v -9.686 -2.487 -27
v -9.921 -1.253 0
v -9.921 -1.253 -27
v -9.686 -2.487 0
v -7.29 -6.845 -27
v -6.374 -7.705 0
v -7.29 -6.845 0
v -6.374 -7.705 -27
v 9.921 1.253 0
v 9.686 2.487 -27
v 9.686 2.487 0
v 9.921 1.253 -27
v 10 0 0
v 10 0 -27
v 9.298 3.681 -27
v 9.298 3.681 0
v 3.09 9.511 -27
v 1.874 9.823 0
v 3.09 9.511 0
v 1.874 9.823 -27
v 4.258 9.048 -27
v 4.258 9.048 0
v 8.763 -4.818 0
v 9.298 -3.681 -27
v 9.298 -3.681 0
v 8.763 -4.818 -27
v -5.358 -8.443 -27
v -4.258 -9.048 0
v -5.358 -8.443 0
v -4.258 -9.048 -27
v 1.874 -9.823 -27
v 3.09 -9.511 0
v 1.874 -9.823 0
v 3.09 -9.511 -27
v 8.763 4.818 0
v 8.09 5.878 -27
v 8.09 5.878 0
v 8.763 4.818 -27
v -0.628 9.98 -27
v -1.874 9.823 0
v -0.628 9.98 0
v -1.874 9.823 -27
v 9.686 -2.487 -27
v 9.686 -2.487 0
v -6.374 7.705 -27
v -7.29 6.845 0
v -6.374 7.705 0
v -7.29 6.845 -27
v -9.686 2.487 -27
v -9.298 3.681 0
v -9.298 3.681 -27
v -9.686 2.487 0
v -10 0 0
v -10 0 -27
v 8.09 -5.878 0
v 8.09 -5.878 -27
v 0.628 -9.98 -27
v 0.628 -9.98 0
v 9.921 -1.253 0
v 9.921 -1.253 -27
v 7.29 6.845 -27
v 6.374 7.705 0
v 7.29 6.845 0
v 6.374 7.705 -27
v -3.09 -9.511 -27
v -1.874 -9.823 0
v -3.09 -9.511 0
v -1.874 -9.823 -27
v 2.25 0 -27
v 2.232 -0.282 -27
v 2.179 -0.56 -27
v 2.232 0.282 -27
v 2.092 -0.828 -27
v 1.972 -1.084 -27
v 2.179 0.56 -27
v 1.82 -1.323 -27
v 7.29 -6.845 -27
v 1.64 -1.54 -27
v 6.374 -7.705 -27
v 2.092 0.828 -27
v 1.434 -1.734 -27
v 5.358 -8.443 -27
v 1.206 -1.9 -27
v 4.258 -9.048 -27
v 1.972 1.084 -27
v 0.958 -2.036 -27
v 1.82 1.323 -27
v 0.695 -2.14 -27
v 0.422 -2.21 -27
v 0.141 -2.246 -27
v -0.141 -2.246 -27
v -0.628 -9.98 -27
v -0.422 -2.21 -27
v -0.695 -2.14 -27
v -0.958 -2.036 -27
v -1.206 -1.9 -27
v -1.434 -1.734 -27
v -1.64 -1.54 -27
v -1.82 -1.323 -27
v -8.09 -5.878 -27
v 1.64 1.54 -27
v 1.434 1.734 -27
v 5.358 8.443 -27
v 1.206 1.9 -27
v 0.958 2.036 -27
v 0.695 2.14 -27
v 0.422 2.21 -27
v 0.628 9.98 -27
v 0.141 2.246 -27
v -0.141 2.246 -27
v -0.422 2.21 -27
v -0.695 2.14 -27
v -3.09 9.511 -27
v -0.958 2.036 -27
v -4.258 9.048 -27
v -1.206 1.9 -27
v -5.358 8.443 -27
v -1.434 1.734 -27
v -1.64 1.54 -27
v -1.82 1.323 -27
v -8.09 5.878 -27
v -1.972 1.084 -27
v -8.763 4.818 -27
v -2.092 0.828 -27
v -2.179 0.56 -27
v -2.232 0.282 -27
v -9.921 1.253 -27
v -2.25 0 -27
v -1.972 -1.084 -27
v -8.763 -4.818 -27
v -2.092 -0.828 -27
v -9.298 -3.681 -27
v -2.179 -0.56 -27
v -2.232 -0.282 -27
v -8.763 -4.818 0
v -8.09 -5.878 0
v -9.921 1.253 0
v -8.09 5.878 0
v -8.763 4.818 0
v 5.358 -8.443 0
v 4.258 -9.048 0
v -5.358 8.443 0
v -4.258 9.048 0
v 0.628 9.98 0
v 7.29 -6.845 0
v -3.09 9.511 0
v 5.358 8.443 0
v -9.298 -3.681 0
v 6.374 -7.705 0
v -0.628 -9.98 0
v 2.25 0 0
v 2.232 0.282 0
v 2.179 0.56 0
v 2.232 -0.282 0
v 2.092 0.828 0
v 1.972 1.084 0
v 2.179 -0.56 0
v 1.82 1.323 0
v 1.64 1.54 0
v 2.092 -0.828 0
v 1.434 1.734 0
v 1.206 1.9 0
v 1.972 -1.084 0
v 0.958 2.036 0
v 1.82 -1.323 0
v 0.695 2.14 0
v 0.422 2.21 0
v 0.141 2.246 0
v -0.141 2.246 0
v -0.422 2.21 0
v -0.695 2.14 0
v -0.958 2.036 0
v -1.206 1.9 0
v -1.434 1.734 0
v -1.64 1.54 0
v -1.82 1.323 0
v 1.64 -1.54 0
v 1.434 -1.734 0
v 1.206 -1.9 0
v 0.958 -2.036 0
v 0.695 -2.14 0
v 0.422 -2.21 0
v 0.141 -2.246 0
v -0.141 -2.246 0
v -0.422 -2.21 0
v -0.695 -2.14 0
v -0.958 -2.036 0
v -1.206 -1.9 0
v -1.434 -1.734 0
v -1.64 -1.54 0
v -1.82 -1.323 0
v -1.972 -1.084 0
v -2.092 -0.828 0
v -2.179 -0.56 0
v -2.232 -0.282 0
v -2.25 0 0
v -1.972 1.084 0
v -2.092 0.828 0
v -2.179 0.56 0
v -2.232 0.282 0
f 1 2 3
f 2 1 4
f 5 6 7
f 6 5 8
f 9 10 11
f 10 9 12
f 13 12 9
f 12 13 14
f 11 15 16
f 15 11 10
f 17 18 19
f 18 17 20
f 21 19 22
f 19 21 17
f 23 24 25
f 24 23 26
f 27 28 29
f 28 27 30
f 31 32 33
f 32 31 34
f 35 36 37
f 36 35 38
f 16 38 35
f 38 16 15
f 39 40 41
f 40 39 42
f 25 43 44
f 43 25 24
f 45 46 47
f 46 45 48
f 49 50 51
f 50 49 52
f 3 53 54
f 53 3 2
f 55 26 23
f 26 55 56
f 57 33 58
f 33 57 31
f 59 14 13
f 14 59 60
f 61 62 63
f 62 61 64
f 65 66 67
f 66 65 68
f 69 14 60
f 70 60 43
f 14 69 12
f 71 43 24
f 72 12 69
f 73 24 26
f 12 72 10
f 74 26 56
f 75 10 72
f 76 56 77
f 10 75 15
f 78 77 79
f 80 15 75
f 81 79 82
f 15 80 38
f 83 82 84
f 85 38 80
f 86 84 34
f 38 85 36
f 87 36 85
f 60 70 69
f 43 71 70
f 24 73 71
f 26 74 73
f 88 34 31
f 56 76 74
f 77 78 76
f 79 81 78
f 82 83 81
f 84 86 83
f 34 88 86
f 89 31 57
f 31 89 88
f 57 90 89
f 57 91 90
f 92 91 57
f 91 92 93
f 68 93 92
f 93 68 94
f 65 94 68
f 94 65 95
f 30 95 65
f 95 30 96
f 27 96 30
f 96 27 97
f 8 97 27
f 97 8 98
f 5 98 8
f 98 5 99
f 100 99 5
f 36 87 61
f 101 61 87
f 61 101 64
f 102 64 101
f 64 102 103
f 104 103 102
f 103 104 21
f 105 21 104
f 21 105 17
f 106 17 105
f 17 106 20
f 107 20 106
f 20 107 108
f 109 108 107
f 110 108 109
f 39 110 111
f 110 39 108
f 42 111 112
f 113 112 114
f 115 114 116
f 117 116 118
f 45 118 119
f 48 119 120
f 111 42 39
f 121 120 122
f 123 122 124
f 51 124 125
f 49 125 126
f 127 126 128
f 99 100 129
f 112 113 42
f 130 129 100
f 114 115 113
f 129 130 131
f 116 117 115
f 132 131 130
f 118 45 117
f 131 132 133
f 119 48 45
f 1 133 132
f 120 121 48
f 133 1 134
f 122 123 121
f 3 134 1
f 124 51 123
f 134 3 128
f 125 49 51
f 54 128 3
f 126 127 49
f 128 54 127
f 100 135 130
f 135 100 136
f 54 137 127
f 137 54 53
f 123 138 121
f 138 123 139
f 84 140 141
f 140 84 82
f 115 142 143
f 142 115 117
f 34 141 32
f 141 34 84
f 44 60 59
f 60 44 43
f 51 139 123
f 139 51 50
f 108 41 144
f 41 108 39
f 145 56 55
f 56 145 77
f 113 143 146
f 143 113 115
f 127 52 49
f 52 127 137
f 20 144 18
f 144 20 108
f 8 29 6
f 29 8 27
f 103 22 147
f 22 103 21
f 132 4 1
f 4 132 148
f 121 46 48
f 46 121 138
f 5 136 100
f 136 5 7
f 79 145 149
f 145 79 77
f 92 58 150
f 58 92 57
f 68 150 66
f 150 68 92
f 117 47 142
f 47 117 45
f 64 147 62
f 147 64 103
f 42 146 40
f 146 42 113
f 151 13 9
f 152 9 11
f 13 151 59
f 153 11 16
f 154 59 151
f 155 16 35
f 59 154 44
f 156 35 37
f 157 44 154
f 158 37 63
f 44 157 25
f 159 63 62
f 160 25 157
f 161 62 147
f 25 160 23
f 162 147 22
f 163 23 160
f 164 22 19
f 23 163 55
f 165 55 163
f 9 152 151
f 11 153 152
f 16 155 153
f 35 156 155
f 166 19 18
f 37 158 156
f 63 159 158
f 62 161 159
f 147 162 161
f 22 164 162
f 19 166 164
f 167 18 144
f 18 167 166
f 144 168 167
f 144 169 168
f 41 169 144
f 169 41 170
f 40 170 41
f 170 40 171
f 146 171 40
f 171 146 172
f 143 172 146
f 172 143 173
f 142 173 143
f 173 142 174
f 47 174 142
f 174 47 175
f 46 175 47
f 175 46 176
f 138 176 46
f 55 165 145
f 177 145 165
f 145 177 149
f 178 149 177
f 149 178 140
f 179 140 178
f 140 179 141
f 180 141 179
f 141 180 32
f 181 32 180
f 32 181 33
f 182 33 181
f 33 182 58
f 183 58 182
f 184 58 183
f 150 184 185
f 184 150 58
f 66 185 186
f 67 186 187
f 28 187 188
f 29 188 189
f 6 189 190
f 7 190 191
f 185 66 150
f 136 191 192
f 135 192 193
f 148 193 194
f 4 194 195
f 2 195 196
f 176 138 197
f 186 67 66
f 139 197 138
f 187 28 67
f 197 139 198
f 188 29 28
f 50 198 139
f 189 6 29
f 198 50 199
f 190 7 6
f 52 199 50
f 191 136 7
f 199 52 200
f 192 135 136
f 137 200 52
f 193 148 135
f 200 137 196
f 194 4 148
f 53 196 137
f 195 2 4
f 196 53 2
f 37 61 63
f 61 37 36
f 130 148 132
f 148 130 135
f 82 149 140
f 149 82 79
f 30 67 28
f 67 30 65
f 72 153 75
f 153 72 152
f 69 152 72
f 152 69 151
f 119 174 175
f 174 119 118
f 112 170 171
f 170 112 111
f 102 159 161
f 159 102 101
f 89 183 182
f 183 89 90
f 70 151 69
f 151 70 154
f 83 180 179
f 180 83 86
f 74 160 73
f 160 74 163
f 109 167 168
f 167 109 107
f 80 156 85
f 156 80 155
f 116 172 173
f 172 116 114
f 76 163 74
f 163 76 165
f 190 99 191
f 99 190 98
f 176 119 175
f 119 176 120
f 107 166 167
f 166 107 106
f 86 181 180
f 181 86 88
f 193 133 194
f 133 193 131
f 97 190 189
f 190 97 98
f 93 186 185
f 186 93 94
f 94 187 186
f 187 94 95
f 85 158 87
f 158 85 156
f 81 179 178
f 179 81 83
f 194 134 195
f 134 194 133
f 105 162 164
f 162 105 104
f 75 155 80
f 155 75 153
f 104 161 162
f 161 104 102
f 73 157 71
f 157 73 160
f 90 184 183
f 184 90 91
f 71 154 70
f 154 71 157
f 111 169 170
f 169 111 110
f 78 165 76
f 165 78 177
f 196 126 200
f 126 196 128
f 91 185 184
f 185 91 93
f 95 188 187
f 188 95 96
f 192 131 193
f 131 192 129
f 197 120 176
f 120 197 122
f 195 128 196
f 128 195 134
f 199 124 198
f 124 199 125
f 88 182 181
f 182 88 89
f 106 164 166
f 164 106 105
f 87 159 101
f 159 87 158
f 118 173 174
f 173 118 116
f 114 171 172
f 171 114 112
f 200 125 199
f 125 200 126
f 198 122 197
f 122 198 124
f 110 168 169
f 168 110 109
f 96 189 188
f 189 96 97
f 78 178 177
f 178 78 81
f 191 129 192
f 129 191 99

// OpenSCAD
$fn = 50;


difference() {
	union() {
		translate(v = [0, 0, -27.0000000000]) {
			cylinder(h = 27, r = 10.0000000000);
		}
	}
	union() {
		#translate(v = [0, 0, -27]) {
			cylinder(h = 27, r = 2.2500000000);
		}
	}
}
